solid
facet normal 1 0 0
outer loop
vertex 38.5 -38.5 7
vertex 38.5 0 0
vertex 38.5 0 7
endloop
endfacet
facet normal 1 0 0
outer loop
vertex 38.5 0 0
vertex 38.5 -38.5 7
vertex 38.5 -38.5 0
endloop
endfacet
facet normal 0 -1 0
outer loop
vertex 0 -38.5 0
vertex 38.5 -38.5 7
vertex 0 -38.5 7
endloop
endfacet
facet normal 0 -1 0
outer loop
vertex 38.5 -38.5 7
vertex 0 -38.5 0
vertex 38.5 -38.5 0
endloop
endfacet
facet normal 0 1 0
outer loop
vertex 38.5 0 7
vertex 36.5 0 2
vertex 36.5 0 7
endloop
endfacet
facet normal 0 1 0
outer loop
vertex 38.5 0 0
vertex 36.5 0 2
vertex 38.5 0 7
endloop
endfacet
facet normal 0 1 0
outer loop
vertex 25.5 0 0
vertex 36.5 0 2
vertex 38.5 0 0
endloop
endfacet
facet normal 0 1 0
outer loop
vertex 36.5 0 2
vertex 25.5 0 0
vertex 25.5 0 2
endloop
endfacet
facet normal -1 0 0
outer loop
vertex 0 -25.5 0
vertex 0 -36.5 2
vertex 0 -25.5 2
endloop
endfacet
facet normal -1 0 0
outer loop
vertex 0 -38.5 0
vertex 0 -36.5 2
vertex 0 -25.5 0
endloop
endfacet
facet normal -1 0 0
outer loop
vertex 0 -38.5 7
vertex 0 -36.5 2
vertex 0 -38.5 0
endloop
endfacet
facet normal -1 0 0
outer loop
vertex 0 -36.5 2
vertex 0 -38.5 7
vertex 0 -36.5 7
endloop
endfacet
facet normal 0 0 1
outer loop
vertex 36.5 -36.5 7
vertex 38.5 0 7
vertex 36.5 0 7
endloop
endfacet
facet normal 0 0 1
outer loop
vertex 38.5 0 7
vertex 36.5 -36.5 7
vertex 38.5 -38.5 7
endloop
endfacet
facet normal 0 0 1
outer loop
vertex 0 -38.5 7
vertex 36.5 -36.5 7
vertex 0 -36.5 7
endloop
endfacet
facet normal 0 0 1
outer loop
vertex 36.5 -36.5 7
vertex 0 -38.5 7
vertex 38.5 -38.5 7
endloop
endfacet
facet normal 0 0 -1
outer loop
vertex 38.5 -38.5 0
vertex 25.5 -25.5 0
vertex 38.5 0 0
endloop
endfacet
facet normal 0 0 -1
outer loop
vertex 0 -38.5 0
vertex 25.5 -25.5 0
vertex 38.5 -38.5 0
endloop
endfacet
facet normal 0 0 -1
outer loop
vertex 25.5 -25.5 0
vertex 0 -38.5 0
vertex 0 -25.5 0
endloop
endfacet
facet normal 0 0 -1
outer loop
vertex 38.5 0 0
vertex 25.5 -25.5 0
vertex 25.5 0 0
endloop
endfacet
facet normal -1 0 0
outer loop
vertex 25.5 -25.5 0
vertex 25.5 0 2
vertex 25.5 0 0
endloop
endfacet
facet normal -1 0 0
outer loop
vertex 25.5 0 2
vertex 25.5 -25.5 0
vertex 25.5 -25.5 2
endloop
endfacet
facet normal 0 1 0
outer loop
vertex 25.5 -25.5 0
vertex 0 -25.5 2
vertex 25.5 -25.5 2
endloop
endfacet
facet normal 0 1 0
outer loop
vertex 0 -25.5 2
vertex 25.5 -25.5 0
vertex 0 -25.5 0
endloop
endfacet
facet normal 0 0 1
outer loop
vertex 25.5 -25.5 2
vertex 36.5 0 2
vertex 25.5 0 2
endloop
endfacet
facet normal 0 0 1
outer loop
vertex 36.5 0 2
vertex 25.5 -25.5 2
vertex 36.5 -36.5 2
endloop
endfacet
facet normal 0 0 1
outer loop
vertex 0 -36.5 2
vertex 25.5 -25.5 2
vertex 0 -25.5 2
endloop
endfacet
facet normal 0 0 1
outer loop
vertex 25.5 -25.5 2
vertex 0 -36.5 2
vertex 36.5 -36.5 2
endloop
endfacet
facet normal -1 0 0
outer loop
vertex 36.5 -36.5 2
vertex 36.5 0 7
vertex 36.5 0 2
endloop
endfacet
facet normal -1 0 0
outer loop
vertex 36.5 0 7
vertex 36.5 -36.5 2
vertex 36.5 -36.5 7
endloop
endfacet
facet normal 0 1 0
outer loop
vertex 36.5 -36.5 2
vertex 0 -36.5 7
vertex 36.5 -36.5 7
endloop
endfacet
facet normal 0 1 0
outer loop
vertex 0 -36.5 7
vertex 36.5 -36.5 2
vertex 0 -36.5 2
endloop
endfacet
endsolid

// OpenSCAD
bezel = 11;
badge = 25.5;
th = 2;
shroud = 5;


rotate([90, 0, 0]) difference() {
    cube([bezel+badge+th, shroud+th, bezel+badge+th]);
    cube([badge, th, badge]);
    translate([0, th, 0]) cube([bezel+badge, shroud, bezel+badge]);
}
